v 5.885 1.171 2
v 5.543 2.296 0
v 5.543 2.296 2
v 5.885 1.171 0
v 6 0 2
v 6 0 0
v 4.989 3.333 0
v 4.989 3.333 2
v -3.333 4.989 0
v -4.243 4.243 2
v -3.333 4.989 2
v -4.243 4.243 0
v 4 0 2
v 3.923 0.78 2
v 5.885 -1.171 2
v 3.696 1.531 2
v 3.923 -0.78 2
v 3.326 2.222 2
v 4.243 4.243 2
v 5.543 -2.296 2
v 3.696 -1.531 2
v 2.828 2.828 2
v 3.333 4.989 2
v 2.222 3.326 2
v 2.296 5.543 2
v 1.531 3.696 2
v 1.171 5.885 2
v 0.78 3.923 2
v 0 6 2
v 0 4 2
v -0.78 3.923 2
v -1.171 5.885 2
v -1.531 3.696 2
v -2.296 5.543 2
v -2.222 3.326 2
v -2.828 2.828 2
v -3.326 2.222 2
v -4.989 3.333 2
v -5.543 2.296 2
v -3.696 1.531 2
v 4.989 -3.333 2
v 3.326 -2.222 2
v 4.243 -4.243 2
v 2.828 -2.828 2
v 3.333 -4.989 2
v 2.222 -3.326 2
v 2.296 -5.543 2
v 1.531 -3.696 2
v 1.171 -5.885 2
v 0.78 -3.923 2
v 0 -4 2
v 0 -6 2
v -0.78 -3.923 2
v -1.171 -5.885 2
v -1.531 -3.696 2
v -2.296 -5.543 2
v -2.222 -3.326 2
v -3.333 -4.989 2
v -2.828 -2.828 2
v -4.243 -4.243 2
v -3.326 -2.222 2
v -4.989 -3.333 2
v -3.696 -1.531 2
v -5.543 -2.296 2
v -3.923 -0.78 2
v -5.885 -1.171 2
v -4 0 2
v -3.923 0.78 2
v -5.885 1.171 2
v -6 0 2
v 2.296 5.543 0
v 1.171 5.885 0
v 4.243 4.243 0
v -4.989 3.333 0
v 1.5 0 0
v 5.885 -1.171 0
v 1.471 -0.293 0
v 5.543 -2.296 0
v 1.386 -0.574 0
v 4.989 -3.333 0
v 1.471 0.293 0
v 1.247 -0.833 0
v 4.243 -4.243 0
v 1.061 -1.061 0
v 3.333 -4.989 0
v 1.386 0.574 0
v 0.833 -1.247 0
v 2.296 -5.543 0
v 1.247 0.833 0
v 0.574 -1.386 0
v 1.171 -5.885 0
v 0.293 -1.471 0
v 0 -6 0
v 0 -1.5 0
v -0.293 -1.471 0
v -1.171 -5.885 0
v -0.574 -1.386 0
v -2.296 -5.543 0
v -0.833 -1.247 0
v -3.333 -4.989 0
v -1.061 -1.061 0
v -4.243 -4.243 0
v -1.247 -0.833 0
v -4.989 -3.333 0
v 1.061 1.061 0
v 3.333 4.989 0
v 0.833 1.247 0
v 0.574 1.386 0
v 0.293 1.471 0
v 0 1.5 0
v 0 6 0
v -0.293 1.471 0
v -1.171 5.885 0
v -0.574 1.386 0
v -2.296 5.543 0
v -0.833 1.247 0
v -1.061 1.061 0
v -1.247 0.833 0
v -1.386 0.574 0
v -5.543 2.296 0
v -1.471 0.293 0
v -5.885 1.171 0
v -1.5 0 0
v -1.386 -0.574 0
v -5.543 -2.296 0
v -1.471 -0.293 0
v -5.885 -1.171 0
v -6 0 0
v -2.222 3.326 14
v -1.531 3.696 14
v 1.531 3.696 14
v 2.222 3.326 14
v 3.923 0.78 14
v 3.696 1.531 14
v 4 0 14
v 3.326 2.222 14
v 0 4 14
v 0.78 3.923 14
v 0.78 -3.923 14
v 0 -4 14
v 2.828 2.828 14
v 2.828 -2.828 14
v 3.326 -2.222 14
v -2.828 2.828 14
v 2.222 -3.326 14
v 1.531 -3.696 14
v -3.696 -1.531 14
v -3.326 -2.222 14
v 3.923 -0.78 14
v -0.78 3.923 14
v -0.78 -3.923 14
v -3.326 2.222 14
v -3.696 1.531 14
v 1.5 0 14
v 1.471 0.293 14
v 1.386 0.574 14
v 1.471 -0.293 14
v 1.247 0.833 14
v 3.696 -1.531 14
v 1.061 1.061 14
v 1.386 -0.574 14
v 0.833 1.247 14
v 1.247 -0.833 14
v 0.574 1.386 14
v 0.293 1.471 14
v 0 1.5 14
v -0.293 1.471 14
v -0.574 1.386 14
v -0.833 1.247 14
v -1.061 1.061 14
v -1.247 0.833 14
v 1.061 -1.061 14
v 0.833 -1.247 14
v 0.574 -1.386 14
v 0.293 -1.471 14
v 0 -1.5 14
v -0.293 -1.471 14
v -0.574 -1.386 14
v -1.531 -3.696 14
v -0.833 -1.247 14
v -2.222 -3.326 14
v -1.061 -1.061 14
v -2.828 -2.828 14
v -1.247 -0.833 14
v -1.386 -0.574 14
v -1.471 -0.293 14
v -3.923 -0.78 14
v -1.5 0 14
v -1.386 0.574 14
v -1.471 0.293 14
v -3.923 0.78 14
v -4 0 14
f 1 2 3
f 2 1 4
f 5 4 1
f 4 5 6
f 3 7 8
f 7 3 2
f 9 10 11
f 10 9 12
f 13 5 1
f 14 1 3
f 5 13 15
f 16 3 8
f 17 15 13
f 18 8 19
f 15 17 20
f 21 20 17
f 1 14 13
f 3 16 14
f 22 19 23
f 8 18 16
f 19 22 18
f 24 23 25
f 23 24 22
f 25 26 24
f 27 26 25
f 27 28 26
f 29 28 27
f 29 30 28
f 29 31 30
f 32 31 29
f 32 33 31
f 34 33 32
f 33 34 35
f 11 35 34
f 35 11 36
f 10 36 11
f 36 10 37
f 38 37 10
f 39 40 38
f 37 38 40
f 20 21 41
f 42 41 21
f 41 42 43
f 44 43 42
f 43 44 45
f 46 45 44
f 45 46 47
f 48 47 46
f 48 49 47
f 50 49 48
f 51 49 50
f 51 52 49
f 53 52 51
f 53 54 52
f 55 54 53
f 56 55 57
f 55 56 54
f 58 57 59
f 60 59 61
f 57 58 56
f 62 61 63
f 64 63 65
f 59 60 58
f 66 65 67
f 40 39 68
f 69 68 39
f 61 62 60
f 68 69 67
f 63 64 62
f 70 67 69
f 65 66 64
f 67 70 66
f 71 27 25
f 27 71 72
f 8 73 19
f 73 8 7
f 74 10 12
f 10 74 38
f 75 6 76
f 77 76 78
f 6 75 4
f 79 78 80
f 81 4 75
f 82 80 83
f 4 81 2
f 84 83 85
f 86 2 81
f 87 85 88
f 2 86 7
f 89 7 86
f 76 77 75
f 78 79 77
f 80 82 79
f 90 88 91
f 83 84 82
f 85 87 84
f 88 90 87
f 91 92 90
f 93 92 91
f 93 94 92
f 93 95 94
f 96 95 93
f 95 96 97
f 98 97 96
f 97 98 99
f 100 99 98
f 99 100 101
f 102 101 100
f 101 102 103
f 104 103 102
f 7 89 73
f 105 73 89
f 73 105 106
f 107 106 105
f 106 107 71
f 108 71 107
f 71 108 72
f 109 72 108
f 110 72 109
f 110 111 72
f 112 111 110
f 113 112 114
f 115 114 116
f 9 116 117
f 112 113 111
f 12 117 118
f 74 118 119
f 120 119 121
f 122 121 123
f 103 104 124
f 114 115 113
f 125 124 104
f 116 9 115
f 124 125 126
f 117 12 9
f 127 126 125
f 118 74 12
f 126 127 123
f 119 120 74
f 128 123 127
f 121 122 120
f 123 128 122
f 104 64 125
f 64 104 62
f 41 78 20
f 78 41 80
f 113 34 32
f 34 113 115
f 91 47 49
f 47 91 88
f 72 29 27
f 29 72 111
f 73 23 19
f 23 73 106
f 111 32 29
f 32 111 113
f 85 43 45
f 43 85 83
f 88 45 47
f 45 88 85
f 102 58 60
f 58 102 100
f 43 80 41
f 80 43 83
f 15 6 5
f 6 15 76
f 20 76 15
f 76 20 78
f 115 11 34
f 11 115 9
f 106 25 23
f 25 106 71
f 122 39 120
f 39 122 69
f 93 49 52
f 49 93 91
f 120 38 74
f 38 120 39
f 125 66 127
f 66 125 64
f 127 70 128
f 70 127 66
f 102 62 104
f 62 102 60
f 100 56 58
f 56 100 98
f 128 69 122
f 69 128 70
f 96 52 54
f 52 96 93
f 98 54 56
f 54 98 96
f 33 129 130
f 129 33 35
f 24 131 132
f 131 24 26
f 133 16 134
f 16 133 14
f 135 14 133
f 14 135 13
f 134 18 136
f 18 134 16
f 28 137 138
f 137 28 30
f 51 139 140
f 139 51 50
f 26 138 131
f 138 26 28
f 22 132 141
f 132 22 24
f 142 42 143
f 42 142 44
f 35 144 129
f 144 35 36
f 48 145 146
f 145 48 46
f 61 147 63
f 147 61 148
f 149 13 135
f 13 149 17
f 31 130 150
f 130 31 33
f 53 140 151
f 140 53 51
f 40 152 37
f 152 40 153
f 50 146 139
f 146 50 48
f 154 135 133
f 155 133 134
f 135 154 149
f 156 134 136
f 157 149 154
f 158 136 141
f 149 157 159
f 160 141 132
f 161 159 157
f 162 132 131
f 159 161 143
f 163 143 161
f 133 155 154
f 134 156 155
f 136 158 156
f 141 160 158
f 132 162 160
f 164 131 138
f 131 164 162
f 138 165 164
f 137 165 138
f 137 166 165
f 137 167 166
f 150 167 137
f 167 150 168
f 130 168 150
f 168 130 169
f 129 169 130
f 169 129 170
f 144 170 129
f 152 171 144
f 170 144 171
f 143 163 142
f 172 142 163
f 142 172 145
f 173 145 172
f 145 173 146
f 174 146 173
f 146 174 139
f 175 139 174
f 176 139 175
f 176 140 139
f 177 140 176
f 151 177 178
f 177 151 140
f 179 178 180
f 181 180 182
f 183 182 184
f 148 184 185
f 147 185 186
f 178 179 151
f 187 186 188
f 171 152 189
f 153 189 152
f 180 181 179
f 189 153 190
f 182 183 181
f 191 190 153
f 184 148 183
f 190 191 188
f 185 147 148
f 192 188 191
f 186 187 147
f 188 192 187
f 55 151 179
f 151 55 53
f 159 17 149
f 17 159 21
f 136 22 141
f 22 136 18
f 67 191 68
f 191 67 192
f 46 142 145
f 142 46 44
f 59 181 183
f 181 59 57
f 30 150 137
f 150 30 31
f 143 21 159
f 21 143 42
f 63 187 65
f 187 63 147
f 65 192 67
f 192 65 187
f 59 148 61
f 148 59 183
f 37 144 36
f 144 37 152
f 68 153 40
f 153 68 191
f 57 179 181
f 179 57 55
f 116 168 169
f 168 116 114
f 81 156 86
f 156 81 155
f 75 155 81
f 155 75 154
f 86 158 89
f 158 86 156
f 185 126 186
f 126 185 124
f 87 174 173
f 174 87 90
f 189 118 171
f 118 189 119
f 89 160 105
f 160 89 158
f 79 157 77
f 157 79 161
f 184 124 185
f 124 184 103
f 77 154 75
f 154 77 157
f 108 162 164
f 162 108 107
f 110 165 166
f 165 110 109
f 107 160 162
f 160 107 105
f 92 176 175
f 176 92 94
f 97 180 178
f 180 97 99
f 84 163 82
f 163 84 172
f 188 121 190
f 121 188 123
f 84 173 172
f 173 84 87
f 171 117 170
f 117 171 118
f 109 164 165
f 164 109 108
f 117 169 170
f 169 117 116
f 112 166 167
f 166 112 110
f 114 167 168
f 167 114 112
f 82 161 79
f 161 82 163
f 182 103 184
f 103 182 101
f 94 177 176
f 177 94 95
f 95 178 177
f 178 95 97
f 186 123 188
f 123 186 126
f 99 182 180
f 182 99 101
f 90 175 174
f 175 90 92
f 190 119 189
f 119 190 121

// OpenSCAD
$fn = 32;

// ----------------------------------------------------------------------
// Micro post: flanged post, 5-20 mm class
// ----------------------------------------------------------------------

// --- parameters (mm) ---
post_d = 8;               // post diameter
post_h = 12;              // post height above the flange
flange_d = 12;            // flange diameter
flange_t = 2;             // flange thickness
bore_d = 3;               // through bore

total_h = post_h + flange_t;  // overall height

difference() {
  union() {
    cylinder(h = flange_t, d = flange_d);
    translate([0, 0, flange_t]) cylinder(h = post_h, d = post_d);
  }
  translate([0, 0, -1]) cylinder(h = total_h + 2, d = bore_d);
}
